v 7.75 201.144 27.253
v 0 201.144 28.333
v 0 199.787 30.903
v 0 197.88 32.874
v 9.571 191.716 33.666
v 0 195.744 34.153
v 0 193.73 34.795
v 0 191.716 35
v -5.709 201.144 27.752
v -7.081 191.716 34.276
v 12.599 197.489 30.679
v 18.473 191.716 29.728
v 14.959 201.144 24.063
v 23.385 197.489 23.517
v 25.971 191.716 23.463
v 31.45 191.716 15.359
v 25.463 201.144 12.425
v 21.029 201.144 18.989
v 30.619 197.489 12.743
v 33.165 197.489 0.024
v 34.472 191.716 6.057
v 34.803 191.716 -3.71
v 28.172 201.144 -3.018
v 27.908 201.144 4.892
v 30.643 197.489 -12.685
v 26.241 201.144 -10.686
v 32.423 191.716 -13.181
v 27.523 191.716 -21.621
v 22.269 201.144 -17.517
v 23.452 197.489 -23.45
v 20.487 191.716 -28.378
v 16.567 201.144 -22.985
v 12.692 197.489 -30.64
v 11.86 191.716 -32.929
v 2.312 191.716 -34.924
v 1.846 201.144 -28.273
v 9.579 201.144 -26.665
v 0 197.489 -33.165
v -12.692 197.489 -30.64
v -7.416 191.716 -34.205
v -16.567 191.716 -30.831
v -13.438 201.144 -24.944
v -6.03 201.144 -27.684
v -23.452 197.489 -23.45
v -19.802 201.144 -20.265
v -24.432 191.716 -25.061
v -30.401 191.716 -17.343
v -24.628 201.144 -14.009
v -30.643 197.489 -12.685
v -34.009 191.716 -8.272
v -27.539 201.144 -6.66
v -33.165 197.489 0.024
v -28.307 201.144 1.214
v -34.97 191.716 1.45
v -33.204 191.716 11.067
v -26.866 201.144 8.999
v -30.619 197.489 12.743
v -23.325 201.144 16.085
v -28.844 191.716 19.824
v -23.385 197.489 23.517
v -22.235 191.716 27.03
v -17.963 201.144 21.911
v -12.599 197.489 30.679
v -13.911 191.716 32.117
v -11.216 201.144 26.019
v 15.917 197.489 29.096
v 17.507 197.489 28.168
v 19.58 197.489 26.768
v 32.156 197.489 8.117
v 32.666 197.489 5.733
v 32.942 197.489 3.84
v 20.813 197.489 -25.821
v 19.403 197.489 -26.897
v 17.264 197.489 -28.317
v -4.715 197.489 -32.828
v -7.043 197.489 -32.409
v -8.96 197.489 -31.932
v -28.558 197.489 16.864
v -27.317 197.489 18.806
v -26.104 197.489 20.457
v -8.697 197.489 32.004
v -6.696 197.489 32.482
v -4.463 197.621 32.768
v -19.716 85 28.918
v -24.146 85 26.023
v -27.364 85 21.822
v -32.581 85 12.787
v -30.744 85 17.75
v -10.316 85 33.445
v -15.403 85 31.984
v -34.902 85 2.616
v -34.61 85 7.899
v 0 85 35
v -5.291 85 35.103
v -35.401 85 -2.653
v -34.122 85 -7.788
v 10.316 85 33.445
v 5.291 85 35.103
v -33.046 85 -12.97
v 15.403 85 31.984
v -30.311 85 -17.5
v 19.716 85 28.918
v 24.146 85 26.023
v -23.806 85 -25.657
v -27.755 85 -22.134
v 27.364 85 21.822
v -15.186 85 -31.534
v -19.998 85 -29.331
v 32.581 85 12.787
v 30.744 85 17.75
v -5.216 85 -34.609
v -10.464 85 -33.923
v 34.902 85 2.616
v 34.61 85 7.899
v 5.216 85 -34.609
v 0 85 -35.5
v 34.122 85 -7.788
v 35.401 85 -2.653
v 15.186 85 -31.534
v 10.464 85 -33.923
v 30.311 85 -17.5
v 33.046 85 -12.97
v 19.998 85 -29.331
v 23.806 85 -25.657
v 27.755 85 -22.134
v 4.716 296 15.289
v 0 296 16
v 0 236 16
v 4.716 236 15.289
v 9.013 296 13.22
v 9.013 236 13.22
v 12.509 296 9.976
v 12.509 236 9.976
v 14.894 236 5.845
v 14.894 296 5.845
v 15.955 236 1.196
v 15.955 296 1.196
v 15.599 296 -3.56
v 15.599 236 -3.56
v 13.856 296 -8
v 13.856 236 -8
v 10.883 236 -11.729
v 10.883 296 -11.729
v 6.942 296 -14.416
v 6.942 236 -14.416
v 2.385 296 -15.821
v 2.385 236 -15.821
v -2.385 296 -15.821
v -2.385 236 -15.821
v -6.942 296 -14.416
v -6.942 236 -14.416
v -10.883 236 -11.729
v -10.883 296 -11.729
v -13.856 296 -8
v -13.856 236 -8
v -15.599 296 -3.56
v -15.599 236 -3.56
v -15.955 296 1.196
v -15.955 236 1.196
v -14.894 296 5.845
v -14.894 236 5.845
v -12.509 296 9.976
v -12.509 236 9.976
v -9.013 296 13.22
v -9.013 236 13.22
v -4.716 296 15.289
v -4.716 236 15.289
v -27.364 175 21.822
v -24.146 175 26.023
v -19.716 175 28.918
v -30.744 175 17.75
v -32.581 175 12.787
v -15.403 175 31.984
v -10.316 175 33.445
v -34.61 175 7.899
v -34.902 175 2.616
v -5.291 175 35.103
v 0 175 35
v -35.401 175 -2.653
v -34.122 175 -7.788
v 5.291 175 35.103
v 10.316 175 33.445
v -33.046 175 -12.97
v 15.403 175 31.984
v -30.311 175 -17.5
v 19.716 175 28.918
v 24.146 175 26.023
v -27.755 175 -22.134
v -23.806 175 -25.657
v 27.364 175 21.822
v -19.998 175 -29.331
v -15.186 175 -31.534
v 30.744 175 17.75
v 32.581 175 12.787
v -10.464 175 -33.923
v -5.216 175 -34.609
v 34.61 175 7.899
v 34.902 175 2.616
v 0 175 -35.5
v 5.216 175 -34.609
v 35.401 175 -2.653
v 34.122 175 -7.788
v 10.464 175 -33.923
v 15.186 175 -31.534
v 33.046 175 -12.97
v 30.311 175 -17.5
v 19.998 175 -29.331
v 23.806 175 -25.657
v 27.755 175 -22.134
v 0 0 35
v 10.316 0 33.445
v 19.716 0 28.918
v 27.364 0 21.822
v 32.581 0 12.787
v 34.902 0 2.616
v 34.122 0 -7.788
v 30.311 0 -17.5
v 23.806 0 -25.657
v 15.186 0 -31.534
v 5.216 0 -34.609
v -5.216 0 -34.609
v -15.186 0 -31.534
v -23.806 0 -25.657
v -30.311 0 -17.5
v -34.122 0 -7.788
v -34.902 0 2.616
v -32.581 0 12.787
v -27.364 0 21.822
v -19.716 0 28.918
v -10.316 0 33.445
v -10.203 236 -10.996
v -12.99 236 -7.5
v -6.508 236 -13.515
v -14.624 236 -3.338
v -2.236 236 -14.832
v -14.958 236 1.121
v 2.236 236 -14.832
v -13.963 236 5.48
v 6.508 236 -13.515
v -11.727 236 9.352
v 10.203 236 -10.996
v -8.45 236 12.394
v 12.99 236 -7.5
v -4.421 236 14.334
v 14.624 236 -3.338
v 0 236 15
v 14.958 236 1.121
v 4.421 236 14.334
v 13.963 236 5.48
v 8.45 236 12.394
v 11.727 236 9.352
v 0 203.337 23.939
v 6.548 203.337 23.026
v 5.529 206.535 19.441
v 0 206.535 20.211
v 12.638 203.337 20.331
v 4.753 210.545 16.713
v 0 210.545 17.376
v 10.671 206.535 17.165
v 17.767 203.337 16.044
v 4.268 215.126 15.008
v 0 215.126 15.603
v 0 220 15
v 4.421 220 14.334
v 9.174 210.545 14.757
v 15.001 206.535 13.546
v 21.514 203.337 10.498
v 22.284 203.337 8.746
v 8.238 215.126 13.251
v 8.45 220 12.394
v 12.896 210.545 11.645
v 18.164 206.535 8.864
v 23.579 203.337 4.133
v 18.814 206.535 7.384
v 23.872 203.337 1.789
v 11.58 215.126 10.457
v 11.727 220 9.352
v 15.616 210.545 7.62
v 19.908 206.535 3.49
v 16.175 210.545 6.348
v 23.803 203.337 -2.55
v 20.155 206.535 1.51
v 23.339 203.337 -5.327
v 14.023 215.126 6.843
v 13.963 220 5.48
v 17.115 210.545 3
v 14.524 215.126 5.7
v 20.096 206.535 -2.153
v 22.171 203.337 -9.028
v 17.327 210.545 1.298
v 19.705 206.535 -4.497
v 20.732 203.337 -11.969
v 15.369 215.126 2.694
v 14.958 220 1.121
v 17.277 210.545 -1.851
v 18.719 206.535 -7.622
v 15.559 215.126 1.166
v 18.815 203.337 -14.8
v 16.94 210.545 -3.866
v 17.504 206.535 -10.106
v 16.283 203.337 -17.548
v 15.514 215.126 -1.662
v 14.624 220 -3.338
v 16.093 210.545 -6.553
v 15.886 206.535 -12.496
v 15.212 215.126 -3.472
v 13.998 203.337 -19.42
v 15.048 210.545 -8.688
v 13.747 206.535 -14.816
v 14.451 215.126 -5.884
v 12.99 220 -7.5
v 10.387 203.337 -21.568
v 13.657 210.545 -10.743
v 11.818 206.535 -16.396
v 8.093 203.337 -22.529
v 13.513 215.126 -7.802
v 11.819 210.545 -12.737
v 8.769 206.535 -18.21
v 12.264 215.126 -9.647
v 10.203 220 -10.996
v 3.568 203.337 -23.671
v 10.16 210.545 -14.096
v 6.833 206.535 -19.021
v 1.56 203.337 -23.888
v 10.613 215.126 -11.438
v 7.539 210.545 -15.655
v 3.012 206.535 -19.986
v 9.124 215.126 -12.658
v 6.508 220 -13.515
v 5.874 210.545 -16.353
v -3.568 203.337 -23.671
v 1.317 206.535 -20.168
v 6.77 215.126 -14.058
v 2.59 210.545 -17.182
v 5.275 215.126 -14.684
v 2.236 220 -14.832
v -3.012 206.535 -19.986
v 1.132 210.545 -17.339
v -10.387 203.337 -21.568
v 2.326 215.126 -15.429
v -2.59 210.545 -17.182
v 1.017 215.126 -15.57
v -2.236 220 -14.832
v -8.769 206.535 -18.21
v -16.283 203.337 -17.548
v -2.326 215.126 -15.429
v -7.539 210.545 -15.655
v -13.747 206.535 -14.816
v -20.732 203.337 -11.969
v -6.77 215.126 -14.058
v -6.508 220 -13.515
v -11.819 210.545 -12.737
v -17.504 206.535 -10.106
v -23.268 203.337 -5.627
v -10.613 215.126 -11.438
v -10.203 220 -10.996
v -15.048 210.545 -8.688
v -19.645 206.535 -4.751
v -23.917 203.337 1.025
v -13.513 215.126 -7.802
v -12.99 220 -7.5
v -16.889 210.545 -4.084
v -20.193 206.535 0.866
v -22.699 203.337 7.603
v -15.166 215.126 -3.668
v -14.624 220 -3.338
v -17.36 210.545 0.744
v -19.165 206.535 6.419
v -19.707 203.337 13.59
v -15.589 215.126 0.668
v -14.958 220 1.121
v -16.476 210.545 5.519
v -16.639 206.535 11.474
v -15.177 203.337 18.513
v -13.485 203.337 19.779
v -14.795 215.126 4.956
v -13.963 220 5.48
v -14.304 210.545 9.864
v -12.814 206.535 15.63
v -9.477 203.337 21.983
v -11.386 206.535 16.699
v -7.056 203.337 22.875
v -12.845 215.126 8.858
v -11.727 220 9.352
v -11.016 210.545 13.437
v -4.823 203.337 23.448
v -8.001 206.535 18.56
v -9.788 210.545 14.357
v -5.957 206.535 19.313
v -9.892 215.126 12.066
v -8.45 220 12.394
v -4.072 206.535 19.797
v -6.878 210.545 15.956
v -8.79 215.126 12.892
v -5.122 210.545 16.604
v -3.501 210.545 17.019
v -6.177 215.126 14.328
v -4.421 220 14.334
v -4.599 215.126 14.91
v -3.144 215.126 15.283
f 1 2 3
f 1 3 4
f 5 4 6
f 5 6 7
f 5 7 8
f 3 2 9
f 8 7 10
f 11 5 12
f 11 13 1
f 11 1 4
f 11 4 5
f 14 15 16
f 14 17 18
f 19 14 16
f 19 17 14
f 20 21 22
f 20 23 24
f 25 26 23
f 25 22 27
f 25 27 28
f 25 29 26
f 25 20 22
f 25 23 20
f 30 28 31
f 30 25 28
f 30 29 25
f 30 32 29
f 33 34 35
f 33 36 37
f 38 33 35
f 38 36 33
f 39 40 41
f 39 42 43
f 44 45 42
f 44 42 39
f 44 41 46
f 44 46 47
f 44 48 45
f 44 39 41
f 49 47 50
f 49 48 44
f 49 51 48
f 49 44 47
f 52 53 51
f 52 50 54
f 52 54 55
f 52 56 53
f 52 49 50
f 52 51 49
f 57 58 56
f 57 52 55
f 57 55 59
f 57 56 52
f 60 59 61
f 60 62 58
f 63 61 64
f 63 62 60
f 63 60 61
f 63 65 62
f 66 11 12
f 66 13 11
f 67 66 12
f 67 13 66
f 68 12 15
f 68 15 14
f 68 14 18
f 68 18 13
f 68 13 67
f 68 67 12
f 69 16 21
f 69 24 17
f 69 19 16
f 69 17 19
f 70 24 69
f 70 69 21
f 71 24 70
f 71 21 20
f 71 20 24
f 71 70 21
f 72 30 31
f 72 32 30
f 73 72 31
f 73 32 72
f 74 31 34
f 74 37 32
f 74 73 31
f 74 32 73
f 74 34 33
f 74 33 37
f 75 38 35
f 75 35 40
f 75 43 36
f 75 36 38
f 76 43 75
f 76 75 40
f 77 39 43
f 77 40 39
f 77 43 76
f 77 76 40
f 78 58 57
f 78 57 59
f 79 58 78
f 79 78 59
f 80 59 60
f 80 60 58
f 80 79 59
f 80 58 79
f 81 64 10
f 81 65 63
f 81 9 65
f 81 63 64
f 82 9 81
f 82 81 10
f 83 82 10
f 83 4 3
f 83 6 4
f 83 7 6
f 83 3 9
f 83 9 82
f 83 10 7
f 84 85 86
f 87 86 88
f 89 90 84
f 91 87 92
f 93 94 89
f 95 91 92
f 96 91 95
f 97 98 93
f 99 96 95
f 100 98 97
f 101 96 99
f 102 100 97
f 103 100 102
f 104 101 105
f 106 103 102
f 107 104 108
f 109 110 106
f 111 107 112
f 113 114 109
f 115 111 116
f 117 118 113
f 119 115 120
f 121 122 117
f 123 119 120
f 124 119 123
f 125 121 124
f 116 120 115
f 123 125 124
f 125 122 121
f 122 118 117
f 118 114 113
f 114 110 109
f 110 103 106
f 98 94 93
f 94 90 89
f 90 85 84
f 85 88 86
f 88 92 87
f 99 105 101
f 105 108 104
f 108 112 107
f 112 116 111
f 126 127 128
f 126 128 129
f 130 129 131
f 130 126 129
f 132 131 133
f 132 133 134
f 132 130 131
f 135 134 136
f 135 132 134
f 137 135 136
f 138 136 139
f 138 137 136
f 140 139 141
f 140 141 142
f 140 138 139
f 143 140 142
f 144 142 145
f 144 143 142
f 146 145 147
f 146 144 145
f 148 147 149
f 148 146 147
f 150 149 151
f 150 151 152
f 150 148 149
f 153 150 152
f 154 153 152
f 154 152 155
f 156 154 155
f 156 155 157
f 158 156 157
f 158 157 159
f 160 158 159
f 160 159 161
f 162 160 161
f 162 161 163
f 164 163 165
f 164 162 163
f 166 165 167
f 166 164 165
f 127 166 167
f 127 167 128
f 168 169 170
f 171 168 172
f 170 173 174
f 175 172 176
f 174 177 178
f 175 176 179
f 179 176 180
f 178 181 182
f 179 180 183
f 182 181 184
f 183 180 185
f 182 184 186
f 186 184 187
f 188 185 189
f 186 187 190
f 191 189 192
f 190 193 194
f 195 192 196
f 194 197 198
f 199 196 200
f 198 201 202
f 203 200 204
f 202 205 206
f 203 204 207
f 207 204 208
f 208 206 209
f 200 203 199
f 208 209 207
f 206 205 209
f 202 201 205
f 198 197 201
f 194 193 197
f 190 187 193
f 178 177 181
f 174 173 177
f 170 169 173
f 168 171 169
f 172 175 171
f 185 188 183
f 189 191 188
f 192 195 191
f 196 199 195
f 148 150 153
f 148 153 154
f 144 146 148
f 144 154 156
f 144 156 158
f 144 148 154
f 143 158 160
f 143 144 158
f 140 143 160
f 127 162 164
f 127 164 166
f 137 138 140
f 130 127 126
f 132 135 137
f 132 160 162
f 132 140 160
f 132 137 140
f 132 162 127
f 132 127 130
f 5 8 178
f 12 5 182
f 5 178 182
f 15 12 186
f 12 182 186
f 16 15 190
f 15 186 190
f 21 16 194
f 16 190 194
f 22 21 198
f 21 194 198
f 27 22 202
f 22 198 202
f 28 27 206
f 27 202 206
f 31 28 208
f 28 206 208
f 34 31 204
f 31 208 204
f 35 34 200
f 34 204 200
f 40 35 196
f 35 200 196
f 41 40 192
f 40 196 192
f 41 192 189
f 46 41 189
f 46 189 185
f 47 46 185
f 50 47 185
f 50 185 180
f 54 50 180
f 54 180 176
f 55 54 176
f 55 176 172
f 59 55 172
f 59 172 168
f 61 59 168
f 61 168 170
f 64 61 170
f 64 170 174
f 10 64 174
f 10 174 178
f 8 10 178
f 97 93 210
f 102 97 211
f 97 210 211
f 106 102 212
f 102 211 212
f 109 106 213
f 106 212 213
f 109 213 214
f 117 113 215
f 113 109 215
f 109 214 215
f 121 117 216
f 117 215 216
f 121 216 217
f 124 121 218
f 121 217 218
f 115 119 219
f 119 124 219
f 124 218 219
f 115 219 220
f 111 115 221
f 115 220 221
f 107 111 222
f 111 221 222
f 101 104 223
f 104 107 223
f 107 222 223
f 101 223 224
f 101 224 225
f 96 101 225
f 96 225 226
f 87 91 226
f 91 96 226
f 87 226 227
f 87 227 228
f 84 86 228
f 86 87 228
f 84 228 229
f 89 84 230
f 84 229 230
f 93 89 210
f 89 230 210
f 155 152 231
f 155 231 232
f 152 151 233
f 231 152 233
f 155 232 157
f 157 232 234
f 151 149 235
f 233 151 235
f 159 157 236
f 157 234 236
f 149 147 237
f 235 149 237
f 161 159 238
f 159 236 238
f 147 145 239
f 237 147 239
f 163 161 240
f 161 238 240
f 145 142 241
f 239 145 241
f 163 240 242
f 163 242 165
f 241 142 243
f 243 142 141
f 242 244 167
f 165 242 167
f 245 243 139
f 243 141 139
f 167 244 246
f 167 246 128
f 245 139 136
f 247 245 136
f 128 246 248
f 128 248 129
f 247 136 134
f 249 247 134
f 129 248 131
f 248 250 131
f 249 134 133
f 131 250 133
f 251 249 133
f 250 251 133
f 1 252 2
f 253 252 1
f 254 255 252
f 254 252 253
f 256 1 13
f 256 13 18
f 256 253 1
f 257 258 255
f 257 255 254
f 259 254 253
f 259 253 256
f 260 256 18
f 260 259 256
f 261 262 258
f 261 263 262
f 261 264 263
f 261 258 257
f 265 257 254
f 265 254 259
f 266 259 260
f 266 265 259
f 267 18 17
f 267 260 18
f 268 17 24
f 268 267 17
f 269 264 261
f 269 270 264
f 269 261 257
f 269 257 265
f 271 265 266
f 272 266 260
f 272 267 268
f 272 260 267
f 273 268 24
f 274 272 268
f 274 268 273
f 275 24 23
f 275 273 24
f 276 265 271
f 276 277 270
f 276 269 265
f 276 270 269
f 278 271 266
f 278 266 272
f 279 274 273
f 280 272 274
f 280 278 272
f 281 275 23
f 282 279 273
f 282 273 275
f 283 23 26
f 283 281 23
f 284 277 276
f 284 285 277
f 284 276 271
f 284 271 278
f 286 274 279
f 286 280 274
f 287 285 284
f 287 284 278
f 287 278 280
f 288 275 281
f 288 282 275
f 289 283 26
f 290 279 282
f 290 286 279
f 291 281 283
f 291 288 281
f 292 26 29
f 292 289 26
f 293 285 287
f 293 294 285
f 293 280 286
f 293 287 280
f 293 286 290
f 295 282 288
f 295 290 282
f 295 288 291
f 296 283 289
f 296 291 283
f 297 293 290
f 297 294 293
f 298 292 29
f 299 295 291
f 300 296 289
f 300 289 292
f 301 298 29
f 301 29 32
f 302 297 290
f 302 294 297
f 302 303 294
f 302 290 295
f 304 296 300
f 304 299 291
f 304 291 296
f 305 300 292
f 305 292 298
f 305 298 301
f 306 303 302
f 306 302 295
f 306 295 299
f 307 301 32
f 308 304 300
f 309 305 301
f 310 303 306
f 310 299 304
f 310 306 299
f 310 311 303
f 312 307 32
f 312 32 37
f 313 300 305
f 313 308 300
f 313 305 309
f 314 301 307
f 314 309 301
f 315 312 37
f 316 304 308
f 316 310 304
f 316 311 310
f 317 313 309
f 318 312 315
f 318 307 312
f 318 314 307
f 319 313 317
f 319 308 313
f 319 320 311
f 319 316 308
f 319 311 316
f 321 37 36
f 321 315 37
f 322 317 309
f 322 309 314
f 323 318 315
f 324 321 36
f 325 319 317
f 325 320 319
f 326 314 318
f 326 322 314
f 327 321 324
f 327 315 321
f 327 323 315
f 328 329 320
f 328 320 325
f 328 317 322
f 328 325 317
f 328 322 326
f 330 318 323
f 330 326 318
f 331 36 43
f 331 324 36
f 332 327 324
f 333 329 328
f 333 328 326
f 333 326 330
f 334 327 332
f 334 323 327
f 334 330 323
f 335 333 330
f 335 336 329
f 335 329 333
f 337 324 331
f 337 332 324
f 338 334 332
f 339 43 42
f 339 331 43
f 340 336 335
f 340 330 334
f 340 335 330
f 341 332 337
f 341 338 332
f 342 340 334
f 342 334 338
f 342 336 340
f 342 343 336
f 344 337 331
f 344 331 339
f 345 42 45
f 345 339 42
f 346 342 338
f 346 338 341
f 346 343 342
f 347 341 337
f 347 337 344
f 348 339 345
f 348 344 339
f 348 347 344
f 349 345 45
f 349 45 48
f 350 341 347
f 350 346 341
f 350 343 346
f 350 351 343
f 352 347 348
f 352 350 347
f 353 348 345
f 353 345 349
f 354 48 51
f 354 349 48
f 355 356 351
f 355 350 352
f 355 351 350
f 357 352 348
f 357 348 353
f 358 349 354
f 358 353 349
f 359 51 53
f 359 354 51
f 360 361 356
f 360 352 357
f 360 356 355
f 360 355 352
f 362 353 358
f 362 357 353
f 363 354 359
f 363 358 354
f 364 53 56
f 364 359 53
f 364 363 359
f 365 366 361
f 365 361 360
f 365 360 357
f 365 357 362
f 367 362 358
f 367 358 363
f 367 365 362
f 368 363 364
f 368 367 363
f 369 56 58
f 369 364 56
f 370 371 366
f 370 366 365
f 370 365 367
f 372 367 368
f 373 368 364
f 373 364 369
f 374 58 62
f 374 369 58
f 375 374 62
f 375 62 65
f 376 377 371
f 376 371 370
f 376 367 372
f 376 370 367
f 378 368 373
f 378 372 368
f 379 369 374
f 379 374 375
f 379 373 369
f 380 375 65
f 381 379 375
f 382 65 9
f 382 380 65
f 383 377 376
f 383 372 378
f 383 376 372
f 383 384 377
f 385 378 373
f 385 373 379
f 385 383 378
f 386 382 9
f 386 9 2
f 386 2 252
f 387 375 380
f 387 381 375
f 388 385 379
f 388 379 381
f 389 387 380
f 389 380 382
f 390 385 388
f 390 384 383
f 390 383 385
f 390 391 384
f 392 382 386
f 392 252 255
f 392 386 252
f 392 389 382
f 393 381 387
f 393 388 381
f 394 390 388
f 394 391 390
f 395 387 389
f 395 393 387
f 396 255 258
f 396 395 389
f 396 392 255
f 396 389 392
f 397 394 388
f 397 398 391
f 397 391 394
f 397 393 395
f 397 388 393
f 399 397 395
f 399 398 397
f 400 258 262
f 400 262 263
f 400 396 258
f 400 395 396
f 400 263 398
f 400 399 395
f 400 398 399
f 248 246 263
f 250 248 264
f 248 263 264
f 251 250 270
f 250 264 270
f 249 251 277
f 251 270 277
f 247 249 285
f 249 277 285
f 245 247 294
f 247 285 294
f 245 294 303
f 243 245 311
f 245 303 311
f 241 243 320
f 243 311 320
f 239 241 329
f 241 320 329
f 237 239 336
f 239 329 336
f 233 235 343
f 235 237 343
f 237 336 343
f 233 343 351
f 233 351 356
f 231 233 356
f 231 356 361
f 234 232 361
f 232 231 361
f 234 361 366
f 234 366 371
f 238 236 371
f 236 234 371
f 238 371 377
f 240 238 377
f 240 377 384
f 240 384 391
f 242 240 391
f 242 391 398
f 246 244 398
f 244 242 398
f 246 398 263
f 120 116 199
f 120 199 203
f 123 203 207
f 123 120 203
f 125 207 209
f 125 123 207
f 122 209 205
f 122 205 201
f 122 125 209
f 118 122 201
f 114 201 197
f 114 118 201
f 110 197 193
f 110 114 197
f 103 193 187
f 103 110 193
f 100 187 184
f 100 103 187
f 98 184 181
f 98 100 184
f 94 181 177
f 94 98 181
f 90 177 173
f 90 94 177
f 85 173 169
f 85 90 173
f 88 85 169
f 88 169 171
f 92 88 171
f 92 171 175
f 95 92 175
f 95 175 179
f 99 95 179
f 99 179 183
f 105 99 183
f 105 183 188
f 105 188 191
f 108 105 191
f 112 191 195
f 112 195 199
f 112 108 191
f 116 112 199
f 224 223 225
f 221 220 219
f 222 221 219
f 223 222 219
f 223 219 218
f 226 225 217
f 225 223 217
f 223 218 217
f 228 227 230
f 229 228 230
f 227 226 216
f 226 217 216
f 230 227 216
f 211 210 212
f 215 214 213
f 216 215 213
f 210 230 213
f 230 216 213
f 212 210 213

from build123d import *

# Parameters (mm, degrees)
SKETCH2_R           = 35
BOSS_EXTRUDE1_DEPTH = 200
SKETCH3_R           = 15
BOSS_EXTRUDE2_DEPTH = 95
FILLET1_R           = 20
FILLET2_R           = 10
BOSS_EXTRUDE3_START = 1
SKETCH4_R           = 16
BOSS_EXTRUDE3_DEPTH = 60
BOSS_EXTRUDE4_START = -85
SKETCH5_R           = 35.5
BOSS_EXTRUDE4_DEPTH = 90


with BuildPart() as part:
    # Sketch2 → Boss-Extrude1 (new body)
    with BuildSketch(Plane(origin=(0, 0, 0), x_dir=(1, 0, 0), z_dir=(0, 1, 0))):
        with Locations(Location((0, 0, 0), (0, 0, 270))):
            Circle(SKETCH2_R)
    extrude(amount=BOSS_EXTRUDE1_DEPTH)

    # Sketch3 → Boss-Extrude2 (add)
    with BuildSketch(Plane(origin=(0, 200, 0), x_dir=(1, 0, 0), z_dir=(0, 1, 0))):
        with Locations(Location((0, 0, 0), (0, 0, 270))):
            Circle(SKETCH3_R)
    extrude(amount=BOSS_EXTRUDE2_DEPTH)

    # Fillet1
    fillet1_edges = [part.edges().sort_by_distance(p)[0] for p in [
        (0, 200, -15),
    ]]
    fillet(fillet1_edges, radius=FILLET1_R - 0.0001)  # a hair under: the kernel refuses the full size

    # Fillet2
    fillet2_edges = [part.edges().sort_by_distance(p)[0] for p in [
        (0, 200, -35),
    ]]
    fillet(fillet2_edges, radius=FILLET2_R)

    # Sketch4 → Boss-Extrude3 (add)
    with BuildSketch(Plane(origin=(0, 295, 0), x_dir=(1, 0, 0), z_dir=(0, 1, 0)).offset(BOSS_EXTRUDE3_START)):
        with Locations(Location((0, 0, 0), (0, 0, 270))):
            Circle(SKETCH4_R)
    extrude(amount=-BOSS_EXTRUDE3_DEPTH)

    # Sketch5 → Boss-Extrude4 (add)
    with BuildSketch(Plane.XZ.offset(BOSS_EXTRUDE4_START)):
        with Locations(Location((0, 0, 0), (0, 0, 270))):
            Circle(SKETCH5_R)
    extrude(amount=-BOSS_EXTRUDE4_DEPTH)


solid = part.part
